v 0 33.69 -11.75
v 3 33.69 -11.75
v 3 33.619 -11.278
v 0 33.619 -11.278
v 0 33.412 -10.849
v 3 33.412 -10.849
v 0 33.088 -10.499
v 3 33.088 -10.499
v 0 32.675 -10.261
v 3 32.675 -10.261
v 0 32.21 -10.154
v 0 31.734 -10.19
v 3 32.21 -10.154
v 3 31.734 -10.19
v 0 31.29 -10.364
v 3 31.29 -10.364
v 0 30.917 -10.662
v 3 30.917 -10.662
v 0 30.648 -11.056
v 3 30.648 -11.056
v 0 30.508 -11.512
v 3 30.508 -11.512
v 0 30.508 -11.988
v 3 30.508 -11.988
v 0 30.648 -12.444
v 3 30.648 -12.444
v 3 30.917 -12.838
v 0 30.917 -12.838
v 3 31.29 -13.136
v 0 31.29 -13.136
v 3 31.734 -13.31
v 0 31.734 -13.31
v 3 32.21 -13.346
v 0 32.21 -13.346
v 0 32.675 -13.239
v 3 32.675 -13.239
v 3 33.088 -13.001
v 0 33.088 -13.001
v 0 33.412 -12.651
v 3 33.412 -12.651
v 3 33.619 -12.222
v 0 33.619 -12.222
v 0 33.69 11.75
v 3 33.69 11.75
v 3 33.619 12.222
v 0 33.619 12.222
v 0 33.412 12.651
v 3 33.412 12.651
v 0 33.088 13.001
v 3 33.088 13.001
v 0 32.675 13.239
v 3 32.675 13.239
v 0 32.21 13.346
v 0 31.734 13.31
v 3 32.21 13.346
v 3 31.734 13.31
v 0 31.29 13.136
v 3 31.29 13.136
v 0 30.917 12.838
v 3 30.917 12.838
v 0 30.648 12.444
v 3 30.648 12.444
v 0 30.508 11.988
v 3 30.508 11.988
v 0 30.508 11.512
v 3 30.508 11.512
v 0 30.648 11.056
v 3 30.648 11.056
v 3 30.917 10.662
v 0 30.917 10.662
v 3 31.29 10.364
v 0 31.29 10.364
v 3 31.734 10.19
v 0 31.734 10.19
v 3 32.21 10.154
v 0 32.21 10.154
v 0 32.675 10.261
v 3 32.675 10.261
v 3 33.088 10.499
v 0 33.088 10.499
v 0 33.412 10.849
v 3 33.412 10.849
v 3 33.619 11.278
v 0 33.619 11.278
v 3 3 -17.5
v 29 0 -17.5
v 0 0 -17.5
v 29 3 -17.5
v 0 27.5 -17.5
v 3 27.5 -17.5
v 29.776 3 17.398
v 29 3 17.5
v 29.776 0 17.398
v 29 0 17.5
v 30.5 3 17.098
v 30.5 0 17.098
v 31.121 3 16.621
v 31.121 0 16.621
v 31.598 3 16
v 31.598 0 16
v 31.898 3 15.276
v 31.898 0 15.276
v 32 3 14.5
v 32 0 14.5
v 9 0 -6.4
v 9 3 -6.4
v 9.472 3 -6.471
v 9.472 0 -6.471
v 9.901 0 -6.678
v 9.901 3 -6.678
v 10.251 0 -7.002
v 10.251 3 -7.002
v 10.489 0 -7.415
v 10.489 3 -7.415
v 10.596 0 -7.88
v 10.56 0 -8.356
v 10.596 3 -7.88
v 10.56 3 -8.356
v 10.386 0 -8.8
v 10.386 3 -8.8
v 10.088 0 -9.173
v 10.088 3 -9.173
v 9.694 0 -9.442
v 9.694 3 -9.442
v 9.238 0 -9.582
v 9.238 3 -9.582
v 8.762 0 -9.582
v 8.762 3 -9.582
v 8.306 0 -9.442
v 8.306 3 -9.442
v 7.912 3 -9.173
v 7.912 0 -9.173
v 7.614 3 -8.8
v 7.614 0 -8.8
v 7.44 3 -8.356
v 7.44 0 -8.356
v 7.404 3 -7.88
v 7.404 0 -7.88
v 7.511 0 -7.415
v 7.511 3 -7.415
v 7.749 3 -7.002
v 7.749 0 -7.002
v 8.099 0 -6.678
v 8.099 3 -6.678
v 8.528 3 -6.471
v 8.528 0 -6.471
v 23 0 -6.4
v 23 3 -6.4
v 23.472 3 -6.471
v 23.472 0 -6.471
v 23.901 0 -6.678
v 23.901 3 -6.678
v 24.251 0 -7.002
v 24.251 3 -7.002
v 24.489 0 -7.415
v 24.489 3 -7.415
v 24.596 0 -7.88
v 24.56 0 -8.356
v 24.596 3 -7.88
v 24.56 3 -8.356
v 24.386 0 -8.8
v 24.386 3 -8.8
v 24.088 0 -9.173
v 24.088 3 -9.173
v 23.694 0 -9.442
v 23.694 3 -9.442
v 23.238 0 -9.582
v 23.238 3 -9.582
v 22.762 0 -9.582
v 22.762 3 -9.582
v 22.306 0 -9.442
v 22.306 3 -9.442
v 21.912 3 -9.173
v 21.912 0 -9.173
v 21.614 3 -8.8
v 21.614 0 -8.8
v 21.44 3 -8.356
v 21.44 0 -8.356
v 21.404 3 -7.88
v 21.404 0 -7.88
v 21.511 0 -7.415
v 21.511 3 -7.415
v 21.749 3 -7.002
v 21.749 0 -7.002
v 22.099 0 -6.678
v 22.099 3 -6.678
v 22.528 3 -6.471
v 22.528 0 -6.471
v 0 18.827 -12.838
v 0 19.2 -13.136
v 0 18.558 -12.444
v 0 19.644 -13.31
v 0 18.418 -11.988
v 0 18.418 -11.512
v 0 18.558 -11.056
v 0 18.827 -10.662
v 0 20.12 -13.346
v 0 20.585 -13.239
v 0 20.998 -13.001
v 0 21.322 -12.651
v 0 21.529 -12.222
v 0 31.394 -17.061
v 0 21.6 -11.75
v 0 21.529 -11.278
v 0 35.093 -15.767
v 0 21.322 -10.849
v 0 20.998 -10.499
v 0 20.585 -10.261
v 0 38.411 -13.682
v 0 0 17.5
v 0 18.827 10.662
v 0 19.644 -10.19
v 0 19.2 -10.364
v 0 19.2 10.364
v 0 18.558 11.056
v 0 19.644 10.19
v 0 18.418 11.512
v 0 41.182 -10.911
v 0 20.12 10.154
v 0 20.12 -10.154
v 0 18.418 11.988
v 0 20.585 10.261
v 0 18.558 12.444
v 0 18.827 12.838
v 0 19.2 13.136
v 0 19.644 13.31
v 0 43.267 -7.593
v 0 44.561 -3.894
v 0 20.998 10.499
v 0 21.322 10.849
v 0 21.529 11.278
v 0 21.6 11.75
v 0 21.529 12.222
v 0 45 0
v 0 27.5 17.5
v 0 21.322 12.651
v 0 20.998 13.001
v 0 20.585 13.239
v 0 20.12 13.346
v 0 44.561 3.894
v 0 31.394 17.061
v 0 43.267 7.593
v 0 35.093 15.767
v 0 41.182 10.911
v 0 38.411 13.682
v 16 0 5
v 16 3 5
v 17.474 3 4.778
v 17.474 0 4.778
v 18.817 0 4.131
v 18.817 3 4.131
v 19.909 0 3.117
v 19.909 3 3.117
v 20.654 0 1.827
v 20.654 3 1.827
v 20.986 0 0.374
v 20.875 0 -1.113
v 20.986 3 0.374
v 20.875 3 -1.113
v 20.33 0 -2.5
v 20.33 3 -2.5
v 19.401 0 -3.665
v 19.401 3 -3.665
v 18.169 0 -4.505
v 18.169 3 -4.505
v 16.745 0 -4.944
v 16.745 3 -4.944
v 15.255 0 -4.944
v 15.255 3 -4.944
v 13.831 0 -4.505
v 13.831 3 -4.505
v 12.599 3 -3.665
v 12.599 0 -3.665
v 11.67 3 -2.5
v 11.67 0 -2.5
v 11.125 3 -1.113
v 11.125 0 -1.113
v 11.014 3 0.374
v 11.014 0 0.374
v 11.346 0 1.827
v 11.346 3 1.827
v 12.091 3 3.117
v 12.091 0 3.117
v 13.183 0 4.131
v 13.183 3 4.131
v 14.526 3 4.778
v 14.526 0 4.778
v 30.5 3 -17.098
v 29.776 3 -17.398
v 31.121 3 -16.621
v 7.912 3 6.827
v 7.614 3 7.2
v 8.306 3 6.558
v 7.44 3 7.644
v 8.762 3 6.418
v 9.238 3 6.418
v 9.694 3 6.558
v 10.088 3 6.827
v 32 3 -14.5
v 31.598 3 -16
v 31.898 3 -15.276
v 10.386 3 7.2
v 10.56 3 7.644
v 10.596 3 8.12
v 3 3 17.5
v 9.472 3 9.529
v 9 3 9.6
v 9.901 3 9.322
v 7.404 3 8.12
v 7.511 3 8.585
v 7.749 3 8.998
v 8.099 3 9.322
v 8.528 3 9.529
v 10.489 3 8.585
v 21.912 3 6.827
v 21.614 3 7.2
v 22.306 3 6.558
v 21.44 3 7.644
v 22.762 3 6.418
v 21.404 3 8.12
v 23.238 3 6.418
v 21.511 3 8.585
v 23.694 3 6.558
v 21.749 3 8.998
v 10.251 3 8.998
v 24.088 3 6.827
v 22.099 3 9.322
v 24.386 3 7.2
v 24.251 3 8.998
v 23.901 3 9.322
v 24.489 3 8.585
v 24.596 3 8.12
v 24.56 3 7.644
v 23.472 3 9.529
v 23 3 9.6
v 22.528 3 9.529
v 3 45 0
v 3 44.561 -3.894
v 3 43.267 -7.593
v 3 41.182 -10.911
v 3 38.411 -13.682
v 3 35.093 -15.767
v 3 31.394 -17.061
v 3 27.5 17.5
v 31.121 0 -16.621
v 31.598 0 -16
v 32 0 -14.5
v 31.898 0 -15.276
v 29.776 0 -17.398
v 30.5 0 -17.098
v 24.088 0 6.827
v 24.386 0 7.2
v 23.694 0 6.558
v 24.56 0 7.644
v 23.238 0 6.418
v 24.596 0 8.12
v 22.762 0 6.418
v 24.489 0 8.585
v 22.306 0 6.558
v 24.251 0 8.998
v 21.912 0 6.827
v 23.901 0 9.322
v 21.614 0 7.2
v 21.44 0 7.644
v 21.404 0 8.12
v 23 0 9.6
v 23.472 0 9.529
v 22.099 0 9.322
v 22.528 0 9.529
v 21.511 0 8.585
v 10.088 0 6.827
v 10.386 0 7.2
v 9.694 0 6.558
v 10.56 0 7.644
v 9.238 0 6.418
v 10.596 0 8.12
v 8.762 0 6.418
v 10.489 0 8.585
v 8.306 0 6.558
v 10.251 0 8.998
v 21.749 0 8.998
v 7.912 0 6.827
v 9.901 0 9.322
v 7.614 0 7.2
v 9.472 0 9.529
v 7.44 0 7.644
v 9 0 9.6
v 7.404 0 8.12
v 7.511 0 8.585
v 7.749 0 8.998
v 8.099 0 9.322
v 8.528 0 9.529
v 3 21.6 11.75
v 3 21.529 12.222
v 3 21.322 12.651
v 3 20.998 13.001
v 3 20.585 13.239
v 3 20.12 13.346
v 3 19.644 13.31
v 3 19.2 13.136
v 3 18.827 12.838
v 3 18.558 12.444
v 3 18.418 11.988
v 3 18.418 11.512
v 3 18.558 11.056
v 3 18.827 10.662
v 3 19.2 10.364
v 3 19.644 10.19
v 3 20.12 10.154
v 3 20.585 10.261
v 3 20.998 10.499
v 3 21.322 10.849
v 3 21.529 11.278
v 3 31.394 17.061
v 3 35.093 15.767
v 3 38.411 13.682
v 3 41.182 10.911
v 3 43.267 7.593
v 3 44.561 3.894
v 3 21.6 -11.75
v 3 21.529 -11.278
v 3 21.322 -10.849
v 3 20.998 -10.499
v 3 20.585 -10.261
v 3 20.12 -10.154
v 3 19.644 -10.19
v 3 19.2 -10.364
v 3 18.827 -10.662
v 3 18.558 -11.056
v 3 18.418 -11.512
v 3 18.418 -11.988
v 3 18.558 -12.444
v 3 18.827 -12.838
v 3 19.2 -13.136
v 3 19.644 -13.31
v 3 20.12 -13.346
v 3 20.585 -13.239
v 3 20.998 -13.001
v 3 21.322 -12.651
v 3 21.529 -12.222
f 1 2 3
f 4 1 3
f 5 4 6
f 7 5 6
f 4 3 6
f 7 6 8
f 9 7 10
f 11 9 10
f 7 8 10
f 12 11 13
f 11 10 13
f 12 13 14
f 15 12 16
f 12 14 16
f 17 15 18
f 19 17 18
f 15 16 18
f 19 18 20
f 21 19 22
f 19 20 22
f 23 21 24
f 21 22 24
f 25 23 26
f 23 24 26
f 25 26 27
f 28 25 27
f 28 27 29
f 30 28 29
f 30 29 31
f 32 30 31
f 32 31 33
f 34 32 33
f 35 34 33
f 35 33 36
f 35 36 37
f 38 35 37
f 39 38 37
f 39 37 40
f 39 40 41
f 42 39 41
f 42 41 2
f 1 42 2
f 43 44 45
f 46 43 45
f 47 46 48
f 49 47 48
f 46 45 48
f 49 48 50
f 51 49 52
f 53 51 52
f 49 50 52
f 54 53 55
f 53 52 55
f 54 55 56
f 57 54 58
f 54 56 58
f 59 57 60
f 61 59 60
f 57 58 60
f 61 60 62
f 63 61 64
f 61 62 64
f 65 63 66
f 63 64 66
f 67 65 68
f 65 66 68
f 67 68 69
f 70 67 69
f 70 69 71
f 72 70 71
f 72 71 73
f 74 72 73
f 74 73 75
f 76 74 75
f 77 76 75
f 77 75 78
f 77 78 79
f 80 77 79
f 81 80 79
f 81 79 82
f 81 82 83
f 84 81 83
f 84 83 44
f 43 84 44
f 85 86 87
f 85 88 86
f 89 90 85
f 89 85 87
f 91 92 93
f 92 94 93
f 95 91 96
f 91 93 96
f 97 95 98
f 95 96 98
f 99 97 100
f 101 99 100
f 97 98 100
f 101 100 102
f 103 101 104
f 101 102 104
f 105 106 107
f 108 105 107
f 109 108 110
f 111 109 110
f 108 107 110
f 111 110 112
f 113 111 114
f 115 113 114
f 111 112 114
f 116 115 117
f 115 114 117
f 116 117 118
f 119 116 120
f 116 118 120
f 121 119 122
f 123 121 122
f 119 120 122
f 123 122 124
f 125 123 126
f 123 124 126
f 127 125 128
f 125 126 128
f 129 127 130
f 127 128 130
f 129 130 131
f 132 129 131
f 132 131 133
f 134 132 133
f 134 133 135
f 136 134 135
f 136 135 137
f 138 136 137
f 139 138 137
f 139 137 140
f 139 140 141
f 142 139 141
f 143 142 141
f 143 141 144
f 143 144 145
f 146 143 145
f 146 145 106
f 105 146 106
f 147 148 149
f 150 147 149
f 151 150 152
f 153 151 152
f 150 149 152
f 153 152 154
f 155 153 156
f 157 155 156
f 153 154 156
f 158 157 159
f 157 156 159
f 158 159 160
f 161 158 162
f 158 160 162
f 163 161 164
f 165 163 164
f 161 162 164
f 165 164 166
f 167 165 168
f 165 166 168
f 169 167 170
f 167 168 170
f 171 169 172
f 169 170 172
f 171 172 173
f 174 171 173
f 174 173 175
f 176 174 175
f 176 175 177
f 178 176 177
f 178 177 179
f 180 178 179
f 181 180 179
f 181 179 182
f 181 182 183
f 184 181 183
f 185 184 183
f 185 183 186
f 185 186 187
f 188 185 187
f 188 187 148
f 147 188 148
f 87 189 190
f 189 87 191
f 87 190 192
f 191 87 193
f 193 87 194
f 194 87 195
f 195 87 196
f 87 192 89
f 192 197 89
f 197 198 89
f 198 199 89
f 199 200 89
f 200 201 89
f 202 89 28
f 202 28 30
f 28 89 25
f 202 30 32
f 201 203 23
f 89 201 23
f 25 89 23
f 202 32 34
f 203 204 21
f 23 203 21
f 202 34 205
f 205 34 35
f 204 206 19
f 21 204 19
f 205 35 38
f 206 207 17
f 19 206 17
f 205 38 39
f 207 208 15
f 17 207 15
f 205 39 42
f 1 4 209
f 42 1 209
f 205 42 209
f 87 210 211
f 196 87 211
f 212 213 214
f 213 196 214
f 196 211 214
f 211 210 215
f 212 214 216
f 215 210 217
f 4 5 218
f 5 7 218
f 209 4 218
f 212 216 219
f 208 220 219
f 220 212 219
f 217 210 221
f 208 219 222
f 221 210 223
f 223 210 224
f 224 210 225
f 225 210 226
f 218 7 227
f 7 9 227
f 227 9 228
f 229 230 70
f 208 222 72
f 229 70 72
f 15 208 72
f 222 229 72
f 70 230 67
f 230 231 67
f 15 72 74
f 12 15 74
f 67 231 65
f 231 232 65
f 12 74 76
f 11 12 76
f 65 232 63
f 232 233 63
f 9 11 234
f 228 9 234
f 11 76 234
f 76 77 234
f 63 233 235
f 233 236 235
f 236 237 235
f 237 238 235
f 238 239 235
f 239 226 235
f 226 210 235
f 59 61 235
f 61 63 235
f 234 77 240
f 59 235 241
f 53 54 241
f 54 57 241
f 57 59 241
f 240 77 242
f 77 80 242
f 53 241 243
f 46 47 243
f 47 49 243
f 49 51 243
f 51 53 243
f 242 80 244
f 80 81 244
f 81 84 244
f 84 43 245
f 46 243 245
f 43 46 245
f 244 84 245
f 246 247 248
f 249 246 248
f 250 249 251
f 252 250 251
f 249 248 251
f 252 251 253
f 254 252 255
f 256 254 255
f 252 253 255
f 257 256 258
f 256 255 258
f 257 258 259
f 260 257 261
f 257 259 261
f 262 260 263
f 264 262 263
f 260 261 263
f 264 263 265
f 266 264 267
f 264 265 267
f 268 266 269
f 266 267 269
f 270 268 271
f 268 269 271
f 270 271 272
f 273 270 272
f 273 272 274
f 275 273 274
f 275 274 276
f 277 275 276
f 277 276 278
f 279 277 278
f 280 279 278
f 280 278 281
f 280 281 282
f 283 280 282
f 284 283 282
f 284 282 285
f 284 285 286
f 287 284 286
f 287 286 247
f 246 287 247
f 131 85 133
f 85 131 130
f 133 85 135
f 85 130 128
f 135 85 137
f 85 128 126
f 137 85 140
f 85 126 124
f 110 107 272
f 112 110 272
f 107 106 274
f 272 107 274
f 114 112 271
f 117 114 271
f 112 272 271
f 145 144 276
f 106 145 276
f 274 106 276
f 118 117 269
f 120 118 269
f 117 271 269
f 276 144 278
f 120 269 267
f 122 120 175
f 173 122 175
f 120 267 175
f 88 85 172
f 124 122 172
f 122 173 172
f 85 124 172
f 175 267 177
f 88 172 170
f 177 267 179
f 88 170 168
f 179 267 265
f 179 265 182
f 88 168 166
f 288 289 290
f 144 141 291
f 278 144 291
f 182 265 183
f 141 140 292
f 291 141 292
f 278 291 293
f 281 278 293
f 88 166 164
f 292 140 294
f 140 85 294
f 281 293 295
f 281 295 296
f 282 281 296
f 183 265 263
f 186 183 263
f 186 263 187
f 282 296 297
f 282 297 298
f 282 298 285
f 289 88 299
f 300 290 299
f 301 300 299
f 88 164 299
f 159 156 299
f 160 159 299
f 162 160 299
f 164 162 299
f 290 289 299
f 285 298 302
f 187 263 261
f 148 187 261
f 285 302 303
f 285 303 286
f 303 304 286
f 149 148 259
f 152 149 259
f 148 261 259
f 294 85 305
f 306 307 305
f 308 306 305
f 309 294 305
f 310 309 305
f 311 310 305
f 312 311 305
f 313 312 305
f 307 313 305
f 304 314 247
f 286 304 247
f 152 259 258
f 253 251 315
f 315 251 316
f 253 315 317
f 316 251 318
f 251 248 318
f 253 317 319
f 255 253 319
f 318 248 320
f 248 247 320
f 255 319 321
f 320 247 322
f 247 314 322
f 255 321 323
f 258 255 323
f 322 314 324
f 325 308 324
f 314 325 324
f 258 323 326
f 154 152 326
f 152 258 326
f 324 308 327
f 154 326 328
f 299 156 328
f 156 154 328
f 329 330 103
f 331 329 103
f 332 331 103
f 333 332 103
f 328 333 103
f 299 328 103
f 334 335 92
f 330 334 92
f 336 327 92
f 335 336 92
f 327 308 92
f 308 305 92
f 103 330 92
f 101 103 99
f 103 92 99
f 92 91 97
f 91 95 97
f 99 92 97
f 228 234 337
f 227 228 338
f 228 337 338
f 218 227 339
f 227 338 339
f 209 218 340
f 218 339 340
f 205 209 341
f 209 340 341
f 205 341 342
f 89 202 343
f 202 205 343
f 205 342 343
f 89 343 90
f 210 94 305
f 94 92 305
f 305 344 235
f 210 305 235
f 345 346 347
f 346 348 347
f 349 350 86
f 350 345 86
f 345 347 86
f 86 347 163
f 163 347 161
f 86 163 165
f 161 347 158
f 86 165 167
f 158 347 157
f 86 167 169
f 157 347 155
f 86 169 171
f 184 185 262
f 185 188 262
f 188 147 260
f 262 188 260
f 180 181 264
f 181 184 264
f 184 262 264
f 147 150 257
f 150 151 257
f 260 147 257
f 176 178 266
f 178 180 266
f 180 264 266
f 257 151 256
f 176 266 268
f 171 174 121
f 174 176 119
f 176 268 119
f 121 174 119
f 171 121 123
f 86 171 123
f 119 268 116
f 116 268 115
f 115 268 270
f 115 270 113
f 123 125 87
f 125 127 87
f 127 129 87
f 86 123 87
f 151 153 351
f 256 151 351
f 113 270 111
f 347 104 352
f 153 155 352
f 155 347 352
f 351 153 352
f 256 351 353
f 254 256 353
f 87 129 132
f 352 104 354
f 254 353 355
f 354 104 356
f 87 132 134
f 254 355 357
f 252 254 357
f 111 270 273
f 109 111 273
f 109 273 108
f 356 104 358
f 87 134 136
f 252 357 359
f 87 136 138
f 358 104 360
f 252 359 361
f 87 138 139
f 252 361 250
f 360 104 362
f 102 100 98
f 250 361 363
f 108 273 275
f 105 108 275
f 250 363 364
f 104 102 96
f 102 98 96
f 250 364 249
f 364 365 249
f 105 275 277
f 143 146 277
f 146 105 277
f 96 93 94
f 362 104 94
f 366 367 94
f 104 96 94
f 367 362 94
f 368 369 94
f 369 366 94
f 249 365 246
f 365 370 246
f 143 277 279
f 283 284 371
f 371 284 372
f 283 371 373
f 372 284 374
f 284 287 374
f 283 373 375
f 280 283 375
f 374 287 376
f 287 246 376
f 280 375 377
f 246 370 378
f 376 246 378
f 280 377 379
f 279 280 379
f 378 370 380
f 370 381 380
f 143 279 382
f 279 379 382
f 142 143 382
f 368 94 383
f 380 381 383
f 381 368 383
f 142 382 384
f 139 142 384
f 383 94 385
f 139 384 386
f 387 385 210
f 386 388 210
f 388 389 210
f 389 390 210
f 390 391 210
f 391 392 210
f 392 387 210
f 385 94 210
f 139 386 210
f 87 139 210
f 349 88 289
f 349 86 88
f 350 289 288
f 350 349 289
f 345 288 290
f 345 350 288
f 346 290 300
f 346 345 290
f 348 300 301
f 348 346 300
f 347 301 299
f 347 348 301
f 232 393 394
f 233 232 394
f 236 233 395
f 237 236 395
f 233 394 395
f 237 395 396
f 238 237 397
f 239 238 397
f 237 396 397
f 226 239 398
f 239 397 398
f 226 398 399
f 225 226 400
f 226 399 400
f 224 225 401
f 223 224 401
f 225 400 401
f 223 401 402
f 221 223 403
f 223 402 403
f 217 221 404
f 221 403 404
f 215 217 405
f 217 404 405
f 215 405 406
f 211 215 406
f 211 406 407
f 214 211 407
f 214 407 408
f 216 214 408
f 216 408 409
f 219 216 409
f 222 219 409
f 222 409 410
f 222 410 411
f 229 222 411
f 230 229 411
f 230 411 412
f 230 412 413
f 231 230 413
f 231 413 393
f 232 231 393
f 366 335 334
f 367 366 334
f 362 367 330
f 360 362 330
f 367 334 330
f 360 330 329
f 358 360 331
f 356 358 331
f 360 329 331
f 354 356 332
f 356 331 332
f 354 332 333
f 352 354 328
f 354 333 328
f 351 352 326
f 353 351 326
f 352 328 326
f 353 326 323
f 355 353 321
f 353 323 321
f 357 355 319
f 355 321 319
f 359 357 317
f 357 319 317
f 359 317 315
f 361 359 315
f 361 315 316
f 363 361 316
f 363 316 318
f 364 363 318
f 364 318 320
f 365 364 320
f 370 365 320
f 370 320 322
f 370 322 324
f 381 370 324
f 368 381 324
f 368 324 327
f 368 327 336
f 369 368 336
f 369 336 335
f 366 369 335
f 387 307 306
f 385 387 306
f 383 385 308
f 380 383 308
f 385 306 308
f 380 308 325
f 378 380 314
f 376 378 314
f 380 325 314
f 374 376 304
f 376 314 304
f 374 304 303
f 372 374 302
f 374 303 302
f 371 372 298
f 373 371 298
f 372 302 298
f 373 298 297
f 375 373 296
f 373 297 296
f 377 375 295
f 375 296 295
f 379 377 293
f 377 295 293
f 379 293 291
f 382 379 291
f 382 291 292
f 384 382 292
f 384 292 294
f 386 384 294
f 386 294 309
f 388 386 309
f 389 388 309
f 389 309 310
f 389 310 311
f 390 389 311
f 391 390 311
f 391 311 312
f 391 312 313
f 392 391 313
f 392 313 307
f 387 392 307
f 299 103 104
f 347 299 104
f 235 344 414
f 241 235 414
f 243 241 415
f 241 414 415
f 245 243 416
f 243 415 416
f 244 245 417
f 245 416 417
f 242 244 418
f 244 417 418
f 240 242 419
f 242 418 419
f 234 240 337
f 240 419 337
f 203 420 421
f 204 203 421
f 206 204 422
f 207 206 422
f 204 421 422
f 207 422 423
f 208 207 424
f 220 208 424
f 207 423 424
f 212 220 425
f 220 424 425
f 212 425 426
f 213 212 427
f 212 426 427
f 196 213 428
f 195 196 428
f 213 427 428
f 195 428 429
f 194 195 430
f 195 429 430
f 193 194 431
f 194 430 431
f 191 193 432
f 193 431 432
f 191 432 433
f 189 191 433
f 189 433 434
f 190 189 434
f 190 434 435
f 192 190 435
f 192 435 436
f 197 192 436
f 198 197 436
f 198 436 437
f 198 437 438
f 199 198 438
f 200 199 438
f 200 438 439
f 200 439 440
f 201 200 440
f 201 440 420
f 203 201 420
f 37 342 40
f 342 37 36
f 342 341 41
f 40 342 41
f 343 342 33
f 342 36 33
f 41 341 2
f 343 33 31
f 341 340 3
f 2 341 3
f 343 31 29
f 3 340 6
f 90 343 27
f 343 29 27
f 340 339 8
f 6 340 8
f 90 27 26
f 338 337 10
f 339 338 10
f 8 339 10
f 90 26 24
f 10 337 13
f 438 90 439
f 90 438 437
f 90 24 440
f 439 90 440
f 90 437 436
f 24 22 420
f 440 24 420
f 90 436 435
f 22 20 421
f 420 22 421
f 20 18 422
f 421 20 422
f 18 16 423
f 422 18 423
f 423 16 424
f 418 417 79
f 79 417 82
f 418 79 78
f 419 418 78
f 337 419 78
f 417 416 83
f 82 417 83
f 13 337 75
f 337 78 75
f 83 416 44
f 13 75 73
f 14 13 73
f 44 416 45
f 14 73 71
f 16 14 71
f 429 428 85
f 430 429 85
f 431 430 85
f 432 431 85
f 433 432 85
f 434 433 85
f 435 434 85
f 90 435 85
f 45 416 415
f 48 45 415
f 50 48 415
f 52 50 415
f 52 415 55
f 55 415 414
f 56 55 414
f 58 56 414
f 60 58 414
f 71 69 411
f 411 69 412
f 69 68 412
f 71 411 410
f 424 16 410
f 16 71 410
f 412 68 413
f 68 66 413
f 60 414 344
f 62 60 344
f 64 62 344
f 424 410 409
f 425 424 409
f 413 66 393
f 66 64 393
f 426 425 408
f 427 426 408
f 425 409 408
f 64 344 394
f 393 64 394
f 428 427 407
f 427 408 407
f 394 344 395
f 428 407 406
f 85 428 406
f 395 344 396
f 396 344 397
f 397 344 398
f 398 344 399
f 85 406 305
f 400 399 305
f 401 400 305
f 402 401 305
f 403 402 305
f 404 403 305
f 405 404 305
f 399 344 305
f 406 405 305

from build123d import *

# Parameters (mm, degrees)
EXTRUDE_1_DEPTH     = 17.5
SKETCH_2_R          = 1.6
CUT_EXTRUDE_2_DEPTH = 26
SKETCH_3_R          = 5
SKETCH_3_R_2        = 1.6
CUT_EXTRUDE_3_DEPTH = 56.625983137
FILLET_2_R          = 3


with BuildPart() as part:
    # 草图1 → 凸台-拉伸1 (new, symmetric)
    with BuildSketch(Plane.XY):
        Polygon((0, 0), (0, 45), (3, 45), (3, 3), (32, 3), (32, 0), align=None)
    extrude(amount=EXTRUDE_1_DEPTH, both=True)

    # 草图2 → 切除-拉伸2 (cut)
    with BuildSketch(Plane(origin=(3, 0, 0), x_dir=(0, 0, -1), z_dir=(1, 0, 0))):
        with BuildLine():
            Line((17.5, 27.5), (17.5, 45))
            Line((17.5, 45), (3.9e-08, 45))
            ThreePointArc((3.9e-08, 45), (12.374368684, 39.874368657), (17.5, 27.5))
        make_face()
        with BuildLine():
            ThreePointArc((-17.5, 27.5), (-12.374368657, 39.874368684), (3.9e-08, 45))
            Line((3.9e-08, 45), (-17.5, 45))
            Line((-17.5, 45), (-17.5, 27.5))
        make_face()
        with Locations(Location((-11.75, 20, 0), (0, 0, 90))):
            Circle(SKETCH_2_R)
        with Locations(Location((11.75, 20, 0), (0, 0, 90))):
            Circle(SKETCH_2_R)
        with Locations(Location((-11.75, 32.09, 0), (0, 0, 90))):
            Circle(SKETCH_2_R)
        with Locations(Location((11.75, 32.09, 0), (0, 0, 90))):
            Circle(SKETCH_2_R)
    extrude(amount=-CUT_EXTRUDE_2_DEPTH, mode=Mode.SUBTRACT)

    # 草图3 → 切除-拉伸3 (cut, through all)
    with BuildSketch(Plane(origin=(0, 3, 0), x_dir=(1, 0, 0), z_dir=(0, 1, 0))):
        with Locations(Location((16, 0, 0), (0, 0, 270))):
            Circle(SKETCH_3_R)
        with Locations(Location((9, 8, 0), (0, 0, 270))):
            Circle(SKETCH_3_R_2)
        with Locations(Location((23, 8, 0), (0, 0, 270))):
            Circle(SKETCH_3_R_2)
        with Locations(Location((23, -8, 0), (0, 0, 270))):
            Circle(SKETCH_3_R_2)
        with Locations(Location((9, -8, 0), (0, 0, 270))):
            Circle(SKETCH_3_R_2)
    extrude(amount=-CUT_EXTRUDE_3_DEPTH, mode=Mode.SUBTRACT)

    # 圆角2
    fillet_2_edges = [part.edges().sort_by_distance(p)[0] for p in [
        (32, 1.5, -17.5),
        (32, 1.5, 17.5),
    ]]
    fillet(fillet_2_edges, radius=FILLET_2_R)


solid = part.part
